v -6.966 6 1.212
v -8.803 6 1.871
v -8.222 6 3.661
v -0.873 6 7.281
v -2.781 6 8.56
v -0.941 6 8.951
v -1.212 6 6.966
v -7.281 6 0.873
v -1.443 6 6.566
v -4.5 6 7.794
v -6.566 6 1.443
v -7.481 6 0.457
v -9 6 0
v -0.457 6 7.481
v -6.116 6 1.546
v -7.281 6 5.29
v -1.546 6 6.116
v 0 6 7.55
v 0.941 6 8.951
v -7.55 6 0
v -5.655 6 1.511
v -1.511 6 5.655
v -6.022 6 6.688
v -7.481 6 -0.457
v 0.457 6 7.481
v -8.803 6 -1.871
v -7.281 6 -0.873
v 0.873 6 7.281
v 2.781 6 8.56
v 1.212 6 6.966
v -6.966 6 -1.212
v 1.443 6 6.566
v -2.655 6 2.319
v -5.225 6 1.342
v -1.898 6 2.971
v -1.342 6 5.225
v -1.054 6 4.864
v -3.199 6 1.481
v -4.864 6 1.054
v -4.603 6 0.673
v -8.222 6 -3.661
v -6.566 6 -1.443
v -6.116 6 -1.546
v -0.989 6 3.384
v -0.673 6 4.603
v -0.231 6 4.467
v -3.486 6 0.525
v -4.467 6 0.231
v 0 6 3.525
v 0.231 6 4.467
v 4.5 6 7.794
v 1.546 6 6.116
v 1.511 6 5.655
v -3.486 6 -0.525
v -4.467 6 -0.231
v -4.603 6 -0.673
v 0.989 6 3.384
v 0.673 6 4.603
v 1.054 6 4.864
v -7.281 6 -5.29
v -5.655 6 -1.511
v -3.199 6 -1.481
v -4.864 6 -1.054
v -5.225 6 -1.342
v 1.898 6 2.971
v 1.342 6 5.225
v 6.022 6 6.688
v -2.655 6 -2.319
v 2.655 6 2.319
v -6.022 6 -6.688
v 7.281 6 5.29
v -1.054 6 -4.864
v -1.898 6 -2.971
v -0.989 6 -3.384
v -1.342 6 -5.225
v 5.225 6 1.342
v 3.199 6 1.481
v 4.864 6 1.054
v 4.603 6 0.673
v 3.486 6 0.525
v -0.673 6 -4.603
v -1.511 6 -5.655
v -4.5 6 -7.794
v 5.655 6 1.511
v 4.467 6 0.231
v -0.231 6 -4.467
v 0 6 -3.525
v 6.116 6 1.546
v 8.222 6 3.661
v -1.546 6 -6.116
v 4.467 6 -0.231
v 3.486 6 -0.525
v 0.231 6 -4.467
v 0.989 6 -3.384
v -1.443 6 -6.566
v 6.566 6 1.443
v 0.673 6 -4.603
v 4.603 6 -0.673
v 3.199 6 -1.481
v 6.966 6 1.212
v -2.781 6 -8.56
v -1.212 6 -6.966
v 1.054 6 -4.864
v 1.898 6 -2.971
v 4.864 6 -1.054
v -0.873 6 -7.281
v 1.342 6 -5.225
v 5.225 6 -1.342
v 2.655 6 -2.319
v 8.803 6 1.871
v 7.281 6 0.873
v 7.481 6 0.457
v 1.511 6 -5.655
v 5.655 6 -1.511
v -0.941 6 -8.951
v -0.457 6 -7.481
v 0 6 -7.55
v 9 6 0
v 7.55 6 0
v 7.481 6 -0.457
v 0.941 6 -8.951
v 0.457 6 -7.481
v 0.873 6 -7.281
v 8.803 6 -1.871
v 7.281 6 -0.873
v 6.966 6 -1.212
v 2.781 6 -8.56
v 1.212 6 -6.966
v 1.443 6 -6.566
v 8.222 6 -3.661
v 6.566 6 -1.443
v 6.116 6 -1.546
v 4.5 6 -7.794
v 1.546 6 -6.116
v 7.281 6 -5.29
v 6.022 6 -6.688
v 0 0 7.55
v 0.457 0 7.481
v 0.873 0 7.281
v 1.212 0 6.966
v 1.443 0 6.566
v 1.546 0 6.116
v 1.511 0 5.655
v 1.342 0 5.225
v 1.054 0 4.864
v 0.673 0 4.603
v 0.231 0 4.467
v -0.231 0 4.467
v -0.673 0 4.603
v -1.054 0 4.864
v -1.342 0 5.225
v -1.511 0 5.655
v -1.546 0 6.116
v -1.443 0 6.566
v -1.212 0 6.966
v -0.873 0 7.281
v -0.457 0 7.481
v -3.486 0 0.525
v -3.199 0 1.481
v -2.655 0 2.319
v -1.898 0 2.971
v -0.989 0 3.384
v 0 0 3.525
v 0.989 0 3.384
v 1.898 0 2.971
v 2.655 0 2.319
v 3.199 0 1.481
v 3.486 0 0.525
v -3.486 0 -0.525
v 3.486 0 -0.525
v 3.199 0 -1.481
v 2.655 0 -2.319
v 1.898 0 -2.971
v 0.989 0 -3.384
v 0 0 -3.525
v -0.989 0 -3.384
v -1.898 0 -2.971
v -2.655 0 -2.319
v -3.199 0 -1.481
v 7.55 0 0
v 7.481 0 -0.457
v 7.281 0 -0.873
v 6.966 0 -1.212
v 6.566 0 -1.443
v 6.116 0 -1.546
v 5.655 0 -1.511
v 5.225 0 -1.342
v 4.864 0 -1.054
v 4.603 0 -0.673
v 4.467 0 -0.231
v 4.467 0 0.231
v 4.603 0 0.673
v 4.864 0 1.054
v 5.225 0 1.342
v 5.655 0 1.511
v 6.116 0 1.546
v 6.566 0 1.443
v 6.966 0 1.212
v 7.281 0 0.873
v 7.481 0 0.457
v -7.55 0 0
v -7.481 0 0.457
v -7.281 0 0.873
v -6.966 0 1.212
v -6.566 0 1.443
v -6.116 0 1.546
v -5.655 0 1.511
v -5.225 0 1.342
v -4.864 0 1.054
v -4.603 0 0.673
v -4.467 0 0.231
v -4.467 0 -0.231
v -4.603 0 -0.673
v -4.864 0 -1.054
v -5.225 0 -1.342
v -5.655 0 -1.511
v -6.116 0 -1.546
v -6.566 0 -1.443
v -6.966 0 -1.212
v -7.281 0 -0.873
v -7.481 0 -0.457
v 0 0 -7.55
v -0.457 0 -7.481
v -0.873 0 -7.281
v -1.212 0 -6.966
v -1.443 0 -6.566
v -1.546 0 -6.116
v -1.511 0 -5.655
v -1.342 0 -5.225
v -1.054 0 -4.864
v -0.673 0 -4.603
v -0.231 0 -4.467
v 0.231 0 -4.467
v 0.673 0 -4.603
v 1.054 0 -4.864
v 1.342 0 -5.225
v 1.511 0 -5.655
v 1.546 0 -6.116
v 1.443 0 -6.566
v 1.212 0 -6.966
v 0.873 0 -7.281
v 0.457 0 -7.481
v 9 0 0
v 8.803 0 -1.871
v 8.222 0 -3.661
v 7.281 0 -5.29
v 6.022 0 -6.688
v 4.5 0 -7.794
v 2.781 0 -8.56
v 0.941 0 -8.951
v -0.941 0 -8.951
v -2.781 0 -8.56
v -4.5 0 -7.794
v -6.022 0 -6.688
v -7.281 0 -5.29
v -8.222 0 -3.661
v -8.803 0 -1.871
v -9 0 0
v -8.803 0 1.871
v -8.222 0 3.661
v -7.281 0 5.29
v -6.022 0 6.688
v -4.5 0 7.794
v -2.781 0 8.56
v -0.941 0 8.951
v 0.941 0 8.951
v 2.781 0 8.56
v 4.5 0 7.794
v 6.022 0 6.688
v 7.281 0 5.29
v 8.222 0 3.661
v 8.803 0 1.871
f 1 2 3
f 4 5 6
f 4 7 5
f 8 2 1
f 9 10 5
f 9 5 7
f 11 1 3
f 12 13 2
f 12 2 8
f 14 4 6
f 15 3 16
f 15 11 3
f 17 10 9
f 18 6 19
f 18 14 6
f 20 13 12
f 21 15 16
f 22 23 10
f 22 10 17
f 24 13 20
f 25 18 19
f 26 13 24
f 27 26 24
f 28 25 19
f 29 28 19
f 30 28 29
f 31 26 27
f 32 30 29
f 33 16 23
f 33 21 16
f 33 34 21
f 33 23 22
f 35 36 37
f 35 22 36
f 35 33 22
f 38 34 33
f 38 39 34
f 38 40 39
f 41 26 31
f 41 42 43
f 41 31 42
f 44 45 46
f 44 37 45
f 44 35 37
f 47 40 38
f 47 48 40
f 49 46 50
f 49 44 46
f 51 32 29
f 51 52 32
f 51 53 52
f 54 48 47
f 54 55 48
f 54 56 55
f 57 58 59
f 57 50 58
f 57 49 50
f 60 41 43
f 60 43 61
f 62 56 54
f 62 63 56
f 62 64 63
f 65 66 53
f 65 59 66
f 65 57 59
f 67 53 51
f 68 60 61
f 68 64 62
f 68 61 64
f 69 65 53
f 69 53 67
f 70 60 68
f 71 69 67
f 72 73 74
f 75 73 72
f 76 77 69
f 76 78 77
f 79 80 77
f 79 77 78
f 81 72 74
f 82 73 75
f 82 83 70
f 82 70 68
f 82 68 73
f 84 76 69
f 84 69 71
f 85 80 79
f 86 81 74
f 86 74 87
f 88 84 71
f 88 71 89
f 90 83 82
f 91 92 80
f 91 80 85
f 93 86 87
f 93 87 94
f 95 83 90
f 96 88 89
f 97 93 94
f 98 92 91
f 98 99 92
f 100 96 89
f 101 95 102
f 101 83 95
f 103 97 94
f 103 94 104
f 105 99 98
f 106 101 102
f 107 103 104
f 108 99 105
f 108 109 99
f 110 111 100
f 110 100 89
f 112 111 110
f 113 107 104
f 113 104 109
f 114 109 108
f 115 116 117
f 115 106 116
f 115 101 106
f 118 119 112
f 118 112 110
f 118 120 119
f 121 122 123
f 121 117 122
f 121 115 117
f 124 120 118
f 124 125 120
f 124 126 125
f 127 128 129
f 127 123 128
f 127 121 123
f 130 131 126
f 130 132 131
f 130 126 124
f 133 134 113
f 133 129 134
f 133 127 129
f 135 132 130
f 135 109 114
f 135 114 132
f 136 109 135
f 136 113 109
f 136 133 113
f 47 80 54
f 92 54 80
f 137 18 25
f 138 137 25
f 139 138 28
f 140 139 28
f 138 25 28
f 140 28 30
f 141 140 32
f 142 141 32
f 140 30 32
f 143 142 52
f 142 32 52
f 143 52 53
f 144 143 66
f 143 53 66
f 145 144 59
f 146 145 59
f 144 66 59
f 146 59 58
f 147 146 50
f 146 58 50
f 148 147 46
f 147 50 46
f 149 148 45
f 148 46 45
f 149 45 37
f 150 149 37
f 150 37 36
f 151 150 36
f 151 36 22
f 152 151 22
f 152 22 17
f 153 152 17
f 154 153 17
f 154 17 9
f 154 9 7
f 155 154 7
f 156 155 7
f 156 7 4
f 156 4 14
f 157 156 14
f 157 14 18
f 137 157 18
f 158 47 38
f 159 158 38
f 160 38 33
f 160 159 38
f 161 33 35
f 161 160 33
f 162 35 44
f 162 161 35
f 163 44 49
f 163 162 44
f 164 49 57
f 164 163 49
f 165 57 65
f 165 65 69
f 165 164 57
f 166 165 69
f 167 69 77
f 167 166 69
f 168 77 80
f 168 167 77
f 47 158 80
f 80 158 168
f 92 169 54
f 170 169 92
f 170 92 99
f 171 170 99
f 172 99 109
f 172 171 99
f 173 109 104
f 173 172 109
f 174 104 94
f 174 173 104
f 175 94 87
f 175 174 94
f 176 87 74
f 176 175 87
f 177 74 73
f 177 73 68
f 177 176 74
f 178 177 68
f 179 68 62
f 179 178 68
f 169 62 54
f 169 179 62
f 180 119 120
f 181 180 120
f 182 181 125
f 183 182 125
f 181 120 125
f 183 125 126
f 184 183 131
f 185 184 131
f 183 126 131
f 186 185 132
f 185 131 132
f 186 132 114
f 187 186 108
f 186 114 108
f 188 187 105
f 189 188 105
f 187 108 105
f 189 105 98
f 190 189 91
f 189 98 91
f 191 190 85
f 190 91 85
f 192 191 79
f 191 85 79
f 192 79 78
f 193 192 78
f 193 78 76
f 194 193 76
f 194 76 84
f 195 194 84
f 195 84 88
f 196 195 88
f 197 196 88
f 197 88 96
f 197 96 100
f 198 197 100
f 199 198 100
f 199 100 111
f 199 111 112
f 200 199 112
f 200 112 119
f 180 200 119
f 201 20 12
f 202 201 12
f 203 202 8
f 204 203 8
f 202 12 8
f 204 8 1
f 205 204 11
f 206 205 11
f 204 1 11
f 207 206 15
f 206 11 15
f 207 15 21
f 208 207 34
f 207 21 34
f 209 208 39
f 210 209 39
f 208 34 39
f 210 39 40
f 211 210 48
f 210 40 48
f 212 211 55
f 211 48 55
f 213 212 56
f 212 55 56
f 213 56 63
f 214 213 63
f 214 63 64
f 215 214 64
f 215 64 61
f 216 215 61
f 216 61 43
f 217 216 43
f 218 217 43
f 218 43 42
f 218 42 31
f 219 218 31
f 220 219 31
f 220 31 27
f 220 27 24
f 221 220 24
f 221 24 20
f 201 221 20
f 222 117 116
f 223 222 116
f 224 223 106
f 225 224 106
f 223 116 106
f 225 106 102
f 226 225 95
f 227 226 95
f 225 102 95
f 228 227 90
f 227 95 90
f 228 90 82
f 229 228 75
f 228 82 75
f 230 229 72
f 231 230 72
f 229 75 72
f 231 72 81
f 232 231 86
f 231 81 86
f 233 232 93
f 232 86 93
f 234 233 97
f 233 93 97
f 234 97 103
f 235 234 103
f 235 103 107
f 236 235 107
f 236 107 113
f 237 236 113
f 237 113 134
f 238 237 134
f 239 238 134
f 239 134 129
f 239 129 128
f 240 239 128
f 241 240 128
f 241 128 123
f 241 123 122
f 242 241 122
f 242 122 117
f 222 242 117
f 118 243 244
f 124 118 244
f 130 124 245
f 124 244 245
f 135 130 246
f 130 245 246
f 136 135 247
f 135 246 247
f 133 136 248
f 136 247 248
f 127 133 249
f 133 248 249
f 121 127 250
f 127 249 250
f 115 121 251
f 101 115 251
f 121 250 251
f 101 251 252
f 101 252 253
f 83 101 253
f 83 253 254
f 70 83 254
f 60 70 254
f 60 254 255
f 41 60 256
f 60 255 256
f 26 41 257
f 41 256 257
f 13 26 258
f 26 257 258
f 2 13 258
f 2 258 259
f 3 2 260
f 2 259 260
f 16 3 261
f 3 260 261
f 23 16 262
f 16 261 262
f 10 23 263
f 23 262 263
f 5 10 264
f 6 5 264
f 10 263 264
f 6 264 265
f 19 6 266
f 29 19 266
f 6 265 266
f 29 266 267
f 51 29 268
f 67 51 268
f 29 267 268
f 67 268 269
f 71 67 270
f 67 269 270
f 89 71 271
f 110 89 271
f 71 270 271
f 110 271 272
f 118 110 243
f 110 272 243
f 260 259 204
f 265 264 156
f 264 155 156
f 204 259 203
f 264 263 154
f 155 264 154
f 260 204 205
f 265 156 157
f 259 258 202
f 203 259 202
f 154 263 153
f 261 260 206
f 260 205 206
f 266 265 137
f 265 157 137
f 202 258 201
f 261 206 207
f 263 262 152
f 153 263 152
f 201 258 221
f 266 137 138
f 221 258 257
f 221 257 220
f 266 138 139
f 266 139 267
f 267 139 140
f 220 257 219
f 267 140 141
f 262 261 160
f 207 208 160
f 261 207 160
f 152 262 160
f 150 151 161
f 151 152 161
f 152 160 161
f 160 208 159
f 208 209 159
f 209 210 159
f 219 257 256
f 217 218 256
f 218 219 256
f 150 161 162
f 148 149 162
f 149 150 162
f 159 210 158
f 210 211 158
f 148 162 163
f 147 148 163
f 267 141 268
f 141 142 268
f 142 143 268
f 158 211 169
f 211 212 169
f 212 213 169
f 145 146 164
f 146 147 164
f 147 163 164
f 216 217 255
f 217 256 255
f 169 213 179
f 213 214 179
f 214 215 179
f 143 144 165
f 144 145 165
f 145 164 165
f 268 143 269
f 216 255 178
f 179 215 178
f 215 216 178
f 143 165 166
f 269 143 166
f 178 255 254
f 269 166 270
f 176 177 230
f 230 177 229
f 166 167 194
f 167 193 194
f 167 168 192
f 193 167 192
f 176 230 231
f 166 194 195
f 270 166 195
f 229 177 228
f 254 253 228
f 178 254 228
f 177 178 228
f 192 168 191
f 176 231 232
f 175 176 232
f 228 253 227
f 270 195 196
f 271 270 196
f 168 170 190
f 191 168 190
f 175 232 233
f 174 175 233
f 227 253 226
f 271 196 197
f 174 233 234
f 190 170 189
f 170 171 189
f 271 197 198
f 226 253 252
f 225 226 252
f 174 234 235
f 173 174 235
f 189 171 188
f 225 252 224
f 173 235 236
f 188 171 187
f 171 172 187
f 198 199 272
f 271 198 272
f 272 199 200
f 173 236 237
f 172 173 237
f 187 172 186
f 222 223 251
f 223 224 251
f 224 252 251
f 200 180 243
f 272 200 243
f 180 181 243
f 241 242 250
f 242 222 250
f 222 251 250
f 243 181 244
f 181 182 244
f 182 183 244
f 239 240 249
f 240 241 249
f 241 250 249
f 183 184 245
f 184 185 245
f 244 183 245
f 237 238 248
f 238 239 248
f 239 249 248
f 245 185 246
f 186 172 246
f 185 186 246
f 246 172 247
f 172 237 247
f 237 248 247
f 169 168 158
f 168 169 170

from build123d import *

# Parameters (mm, degrees)
SKETCH1_R           = 9
SKETCH1_R_2         = 3.525
BOSS_EXTRUDE1_DEPTH = 6
SKETCH2_W           = 7.05
SKETCH2_H           = 1.05
BOSS_EXTRUDE2_DEPTH = 6
SKETCH3_R           = 1.55
CUT_EXTRUDE1_DEPTH  = 8
CIRPATTERN1_COUNT   = 4


with BuildPart() as part:
    # Sketch1 → Boss-Extrude1 (new body)
    with BuildSketch(Plane(origin=(0, 0, 0), x_dir=(1, 0, 0), z_dir=(0, 1, 0))):
        Circle(SKETCH1_R)
        Circle(SKETCH1_R_2, mode=Mode.SUBTRACT)
    extrude(amount=BOSS_EXTRUDE1_DEPTH)

    # Sketch2 → Boss-Extrude2 (add)
    with BuildSketch(Plane(origin=(0, 0, 0), x_dir=(1, 0, 0), z_dir=(0, 1, 0))):
        Rectangle(SKETCH2_W, SKETCH2_H)
    extrude(amount=BOSS_EXTRUDE2_DEPTH)

    # Sketch3 → Cut-Extrude1 (cut)
    with BuildSketch(Plane(origin=(0, 6, 0), x_dir=(1, 0, 0), z_dir=(0, 1, 0))):
        with Locations((6, 0)):
            Circle(SKETCH3_R)
    cut_extrude1 = extrude(amount=-CUT_EXTRUDE1_DEPTH, mode=Mode.SUBTRACT)

    # CirPattern1: Cut-Extrude1 ×4 about axis
    cirpattern1_axis = Axis((0, 0, 0), (0, 1, 0))
    for i in range(1, CIRPATTERN1_COUNT):
        add(cut_extrude1.rotate(cirpattern1_axis, i * 360 / CIRPATTERN1_COUNT), mode=Mode.SUBTRACT)


solid = part.part
